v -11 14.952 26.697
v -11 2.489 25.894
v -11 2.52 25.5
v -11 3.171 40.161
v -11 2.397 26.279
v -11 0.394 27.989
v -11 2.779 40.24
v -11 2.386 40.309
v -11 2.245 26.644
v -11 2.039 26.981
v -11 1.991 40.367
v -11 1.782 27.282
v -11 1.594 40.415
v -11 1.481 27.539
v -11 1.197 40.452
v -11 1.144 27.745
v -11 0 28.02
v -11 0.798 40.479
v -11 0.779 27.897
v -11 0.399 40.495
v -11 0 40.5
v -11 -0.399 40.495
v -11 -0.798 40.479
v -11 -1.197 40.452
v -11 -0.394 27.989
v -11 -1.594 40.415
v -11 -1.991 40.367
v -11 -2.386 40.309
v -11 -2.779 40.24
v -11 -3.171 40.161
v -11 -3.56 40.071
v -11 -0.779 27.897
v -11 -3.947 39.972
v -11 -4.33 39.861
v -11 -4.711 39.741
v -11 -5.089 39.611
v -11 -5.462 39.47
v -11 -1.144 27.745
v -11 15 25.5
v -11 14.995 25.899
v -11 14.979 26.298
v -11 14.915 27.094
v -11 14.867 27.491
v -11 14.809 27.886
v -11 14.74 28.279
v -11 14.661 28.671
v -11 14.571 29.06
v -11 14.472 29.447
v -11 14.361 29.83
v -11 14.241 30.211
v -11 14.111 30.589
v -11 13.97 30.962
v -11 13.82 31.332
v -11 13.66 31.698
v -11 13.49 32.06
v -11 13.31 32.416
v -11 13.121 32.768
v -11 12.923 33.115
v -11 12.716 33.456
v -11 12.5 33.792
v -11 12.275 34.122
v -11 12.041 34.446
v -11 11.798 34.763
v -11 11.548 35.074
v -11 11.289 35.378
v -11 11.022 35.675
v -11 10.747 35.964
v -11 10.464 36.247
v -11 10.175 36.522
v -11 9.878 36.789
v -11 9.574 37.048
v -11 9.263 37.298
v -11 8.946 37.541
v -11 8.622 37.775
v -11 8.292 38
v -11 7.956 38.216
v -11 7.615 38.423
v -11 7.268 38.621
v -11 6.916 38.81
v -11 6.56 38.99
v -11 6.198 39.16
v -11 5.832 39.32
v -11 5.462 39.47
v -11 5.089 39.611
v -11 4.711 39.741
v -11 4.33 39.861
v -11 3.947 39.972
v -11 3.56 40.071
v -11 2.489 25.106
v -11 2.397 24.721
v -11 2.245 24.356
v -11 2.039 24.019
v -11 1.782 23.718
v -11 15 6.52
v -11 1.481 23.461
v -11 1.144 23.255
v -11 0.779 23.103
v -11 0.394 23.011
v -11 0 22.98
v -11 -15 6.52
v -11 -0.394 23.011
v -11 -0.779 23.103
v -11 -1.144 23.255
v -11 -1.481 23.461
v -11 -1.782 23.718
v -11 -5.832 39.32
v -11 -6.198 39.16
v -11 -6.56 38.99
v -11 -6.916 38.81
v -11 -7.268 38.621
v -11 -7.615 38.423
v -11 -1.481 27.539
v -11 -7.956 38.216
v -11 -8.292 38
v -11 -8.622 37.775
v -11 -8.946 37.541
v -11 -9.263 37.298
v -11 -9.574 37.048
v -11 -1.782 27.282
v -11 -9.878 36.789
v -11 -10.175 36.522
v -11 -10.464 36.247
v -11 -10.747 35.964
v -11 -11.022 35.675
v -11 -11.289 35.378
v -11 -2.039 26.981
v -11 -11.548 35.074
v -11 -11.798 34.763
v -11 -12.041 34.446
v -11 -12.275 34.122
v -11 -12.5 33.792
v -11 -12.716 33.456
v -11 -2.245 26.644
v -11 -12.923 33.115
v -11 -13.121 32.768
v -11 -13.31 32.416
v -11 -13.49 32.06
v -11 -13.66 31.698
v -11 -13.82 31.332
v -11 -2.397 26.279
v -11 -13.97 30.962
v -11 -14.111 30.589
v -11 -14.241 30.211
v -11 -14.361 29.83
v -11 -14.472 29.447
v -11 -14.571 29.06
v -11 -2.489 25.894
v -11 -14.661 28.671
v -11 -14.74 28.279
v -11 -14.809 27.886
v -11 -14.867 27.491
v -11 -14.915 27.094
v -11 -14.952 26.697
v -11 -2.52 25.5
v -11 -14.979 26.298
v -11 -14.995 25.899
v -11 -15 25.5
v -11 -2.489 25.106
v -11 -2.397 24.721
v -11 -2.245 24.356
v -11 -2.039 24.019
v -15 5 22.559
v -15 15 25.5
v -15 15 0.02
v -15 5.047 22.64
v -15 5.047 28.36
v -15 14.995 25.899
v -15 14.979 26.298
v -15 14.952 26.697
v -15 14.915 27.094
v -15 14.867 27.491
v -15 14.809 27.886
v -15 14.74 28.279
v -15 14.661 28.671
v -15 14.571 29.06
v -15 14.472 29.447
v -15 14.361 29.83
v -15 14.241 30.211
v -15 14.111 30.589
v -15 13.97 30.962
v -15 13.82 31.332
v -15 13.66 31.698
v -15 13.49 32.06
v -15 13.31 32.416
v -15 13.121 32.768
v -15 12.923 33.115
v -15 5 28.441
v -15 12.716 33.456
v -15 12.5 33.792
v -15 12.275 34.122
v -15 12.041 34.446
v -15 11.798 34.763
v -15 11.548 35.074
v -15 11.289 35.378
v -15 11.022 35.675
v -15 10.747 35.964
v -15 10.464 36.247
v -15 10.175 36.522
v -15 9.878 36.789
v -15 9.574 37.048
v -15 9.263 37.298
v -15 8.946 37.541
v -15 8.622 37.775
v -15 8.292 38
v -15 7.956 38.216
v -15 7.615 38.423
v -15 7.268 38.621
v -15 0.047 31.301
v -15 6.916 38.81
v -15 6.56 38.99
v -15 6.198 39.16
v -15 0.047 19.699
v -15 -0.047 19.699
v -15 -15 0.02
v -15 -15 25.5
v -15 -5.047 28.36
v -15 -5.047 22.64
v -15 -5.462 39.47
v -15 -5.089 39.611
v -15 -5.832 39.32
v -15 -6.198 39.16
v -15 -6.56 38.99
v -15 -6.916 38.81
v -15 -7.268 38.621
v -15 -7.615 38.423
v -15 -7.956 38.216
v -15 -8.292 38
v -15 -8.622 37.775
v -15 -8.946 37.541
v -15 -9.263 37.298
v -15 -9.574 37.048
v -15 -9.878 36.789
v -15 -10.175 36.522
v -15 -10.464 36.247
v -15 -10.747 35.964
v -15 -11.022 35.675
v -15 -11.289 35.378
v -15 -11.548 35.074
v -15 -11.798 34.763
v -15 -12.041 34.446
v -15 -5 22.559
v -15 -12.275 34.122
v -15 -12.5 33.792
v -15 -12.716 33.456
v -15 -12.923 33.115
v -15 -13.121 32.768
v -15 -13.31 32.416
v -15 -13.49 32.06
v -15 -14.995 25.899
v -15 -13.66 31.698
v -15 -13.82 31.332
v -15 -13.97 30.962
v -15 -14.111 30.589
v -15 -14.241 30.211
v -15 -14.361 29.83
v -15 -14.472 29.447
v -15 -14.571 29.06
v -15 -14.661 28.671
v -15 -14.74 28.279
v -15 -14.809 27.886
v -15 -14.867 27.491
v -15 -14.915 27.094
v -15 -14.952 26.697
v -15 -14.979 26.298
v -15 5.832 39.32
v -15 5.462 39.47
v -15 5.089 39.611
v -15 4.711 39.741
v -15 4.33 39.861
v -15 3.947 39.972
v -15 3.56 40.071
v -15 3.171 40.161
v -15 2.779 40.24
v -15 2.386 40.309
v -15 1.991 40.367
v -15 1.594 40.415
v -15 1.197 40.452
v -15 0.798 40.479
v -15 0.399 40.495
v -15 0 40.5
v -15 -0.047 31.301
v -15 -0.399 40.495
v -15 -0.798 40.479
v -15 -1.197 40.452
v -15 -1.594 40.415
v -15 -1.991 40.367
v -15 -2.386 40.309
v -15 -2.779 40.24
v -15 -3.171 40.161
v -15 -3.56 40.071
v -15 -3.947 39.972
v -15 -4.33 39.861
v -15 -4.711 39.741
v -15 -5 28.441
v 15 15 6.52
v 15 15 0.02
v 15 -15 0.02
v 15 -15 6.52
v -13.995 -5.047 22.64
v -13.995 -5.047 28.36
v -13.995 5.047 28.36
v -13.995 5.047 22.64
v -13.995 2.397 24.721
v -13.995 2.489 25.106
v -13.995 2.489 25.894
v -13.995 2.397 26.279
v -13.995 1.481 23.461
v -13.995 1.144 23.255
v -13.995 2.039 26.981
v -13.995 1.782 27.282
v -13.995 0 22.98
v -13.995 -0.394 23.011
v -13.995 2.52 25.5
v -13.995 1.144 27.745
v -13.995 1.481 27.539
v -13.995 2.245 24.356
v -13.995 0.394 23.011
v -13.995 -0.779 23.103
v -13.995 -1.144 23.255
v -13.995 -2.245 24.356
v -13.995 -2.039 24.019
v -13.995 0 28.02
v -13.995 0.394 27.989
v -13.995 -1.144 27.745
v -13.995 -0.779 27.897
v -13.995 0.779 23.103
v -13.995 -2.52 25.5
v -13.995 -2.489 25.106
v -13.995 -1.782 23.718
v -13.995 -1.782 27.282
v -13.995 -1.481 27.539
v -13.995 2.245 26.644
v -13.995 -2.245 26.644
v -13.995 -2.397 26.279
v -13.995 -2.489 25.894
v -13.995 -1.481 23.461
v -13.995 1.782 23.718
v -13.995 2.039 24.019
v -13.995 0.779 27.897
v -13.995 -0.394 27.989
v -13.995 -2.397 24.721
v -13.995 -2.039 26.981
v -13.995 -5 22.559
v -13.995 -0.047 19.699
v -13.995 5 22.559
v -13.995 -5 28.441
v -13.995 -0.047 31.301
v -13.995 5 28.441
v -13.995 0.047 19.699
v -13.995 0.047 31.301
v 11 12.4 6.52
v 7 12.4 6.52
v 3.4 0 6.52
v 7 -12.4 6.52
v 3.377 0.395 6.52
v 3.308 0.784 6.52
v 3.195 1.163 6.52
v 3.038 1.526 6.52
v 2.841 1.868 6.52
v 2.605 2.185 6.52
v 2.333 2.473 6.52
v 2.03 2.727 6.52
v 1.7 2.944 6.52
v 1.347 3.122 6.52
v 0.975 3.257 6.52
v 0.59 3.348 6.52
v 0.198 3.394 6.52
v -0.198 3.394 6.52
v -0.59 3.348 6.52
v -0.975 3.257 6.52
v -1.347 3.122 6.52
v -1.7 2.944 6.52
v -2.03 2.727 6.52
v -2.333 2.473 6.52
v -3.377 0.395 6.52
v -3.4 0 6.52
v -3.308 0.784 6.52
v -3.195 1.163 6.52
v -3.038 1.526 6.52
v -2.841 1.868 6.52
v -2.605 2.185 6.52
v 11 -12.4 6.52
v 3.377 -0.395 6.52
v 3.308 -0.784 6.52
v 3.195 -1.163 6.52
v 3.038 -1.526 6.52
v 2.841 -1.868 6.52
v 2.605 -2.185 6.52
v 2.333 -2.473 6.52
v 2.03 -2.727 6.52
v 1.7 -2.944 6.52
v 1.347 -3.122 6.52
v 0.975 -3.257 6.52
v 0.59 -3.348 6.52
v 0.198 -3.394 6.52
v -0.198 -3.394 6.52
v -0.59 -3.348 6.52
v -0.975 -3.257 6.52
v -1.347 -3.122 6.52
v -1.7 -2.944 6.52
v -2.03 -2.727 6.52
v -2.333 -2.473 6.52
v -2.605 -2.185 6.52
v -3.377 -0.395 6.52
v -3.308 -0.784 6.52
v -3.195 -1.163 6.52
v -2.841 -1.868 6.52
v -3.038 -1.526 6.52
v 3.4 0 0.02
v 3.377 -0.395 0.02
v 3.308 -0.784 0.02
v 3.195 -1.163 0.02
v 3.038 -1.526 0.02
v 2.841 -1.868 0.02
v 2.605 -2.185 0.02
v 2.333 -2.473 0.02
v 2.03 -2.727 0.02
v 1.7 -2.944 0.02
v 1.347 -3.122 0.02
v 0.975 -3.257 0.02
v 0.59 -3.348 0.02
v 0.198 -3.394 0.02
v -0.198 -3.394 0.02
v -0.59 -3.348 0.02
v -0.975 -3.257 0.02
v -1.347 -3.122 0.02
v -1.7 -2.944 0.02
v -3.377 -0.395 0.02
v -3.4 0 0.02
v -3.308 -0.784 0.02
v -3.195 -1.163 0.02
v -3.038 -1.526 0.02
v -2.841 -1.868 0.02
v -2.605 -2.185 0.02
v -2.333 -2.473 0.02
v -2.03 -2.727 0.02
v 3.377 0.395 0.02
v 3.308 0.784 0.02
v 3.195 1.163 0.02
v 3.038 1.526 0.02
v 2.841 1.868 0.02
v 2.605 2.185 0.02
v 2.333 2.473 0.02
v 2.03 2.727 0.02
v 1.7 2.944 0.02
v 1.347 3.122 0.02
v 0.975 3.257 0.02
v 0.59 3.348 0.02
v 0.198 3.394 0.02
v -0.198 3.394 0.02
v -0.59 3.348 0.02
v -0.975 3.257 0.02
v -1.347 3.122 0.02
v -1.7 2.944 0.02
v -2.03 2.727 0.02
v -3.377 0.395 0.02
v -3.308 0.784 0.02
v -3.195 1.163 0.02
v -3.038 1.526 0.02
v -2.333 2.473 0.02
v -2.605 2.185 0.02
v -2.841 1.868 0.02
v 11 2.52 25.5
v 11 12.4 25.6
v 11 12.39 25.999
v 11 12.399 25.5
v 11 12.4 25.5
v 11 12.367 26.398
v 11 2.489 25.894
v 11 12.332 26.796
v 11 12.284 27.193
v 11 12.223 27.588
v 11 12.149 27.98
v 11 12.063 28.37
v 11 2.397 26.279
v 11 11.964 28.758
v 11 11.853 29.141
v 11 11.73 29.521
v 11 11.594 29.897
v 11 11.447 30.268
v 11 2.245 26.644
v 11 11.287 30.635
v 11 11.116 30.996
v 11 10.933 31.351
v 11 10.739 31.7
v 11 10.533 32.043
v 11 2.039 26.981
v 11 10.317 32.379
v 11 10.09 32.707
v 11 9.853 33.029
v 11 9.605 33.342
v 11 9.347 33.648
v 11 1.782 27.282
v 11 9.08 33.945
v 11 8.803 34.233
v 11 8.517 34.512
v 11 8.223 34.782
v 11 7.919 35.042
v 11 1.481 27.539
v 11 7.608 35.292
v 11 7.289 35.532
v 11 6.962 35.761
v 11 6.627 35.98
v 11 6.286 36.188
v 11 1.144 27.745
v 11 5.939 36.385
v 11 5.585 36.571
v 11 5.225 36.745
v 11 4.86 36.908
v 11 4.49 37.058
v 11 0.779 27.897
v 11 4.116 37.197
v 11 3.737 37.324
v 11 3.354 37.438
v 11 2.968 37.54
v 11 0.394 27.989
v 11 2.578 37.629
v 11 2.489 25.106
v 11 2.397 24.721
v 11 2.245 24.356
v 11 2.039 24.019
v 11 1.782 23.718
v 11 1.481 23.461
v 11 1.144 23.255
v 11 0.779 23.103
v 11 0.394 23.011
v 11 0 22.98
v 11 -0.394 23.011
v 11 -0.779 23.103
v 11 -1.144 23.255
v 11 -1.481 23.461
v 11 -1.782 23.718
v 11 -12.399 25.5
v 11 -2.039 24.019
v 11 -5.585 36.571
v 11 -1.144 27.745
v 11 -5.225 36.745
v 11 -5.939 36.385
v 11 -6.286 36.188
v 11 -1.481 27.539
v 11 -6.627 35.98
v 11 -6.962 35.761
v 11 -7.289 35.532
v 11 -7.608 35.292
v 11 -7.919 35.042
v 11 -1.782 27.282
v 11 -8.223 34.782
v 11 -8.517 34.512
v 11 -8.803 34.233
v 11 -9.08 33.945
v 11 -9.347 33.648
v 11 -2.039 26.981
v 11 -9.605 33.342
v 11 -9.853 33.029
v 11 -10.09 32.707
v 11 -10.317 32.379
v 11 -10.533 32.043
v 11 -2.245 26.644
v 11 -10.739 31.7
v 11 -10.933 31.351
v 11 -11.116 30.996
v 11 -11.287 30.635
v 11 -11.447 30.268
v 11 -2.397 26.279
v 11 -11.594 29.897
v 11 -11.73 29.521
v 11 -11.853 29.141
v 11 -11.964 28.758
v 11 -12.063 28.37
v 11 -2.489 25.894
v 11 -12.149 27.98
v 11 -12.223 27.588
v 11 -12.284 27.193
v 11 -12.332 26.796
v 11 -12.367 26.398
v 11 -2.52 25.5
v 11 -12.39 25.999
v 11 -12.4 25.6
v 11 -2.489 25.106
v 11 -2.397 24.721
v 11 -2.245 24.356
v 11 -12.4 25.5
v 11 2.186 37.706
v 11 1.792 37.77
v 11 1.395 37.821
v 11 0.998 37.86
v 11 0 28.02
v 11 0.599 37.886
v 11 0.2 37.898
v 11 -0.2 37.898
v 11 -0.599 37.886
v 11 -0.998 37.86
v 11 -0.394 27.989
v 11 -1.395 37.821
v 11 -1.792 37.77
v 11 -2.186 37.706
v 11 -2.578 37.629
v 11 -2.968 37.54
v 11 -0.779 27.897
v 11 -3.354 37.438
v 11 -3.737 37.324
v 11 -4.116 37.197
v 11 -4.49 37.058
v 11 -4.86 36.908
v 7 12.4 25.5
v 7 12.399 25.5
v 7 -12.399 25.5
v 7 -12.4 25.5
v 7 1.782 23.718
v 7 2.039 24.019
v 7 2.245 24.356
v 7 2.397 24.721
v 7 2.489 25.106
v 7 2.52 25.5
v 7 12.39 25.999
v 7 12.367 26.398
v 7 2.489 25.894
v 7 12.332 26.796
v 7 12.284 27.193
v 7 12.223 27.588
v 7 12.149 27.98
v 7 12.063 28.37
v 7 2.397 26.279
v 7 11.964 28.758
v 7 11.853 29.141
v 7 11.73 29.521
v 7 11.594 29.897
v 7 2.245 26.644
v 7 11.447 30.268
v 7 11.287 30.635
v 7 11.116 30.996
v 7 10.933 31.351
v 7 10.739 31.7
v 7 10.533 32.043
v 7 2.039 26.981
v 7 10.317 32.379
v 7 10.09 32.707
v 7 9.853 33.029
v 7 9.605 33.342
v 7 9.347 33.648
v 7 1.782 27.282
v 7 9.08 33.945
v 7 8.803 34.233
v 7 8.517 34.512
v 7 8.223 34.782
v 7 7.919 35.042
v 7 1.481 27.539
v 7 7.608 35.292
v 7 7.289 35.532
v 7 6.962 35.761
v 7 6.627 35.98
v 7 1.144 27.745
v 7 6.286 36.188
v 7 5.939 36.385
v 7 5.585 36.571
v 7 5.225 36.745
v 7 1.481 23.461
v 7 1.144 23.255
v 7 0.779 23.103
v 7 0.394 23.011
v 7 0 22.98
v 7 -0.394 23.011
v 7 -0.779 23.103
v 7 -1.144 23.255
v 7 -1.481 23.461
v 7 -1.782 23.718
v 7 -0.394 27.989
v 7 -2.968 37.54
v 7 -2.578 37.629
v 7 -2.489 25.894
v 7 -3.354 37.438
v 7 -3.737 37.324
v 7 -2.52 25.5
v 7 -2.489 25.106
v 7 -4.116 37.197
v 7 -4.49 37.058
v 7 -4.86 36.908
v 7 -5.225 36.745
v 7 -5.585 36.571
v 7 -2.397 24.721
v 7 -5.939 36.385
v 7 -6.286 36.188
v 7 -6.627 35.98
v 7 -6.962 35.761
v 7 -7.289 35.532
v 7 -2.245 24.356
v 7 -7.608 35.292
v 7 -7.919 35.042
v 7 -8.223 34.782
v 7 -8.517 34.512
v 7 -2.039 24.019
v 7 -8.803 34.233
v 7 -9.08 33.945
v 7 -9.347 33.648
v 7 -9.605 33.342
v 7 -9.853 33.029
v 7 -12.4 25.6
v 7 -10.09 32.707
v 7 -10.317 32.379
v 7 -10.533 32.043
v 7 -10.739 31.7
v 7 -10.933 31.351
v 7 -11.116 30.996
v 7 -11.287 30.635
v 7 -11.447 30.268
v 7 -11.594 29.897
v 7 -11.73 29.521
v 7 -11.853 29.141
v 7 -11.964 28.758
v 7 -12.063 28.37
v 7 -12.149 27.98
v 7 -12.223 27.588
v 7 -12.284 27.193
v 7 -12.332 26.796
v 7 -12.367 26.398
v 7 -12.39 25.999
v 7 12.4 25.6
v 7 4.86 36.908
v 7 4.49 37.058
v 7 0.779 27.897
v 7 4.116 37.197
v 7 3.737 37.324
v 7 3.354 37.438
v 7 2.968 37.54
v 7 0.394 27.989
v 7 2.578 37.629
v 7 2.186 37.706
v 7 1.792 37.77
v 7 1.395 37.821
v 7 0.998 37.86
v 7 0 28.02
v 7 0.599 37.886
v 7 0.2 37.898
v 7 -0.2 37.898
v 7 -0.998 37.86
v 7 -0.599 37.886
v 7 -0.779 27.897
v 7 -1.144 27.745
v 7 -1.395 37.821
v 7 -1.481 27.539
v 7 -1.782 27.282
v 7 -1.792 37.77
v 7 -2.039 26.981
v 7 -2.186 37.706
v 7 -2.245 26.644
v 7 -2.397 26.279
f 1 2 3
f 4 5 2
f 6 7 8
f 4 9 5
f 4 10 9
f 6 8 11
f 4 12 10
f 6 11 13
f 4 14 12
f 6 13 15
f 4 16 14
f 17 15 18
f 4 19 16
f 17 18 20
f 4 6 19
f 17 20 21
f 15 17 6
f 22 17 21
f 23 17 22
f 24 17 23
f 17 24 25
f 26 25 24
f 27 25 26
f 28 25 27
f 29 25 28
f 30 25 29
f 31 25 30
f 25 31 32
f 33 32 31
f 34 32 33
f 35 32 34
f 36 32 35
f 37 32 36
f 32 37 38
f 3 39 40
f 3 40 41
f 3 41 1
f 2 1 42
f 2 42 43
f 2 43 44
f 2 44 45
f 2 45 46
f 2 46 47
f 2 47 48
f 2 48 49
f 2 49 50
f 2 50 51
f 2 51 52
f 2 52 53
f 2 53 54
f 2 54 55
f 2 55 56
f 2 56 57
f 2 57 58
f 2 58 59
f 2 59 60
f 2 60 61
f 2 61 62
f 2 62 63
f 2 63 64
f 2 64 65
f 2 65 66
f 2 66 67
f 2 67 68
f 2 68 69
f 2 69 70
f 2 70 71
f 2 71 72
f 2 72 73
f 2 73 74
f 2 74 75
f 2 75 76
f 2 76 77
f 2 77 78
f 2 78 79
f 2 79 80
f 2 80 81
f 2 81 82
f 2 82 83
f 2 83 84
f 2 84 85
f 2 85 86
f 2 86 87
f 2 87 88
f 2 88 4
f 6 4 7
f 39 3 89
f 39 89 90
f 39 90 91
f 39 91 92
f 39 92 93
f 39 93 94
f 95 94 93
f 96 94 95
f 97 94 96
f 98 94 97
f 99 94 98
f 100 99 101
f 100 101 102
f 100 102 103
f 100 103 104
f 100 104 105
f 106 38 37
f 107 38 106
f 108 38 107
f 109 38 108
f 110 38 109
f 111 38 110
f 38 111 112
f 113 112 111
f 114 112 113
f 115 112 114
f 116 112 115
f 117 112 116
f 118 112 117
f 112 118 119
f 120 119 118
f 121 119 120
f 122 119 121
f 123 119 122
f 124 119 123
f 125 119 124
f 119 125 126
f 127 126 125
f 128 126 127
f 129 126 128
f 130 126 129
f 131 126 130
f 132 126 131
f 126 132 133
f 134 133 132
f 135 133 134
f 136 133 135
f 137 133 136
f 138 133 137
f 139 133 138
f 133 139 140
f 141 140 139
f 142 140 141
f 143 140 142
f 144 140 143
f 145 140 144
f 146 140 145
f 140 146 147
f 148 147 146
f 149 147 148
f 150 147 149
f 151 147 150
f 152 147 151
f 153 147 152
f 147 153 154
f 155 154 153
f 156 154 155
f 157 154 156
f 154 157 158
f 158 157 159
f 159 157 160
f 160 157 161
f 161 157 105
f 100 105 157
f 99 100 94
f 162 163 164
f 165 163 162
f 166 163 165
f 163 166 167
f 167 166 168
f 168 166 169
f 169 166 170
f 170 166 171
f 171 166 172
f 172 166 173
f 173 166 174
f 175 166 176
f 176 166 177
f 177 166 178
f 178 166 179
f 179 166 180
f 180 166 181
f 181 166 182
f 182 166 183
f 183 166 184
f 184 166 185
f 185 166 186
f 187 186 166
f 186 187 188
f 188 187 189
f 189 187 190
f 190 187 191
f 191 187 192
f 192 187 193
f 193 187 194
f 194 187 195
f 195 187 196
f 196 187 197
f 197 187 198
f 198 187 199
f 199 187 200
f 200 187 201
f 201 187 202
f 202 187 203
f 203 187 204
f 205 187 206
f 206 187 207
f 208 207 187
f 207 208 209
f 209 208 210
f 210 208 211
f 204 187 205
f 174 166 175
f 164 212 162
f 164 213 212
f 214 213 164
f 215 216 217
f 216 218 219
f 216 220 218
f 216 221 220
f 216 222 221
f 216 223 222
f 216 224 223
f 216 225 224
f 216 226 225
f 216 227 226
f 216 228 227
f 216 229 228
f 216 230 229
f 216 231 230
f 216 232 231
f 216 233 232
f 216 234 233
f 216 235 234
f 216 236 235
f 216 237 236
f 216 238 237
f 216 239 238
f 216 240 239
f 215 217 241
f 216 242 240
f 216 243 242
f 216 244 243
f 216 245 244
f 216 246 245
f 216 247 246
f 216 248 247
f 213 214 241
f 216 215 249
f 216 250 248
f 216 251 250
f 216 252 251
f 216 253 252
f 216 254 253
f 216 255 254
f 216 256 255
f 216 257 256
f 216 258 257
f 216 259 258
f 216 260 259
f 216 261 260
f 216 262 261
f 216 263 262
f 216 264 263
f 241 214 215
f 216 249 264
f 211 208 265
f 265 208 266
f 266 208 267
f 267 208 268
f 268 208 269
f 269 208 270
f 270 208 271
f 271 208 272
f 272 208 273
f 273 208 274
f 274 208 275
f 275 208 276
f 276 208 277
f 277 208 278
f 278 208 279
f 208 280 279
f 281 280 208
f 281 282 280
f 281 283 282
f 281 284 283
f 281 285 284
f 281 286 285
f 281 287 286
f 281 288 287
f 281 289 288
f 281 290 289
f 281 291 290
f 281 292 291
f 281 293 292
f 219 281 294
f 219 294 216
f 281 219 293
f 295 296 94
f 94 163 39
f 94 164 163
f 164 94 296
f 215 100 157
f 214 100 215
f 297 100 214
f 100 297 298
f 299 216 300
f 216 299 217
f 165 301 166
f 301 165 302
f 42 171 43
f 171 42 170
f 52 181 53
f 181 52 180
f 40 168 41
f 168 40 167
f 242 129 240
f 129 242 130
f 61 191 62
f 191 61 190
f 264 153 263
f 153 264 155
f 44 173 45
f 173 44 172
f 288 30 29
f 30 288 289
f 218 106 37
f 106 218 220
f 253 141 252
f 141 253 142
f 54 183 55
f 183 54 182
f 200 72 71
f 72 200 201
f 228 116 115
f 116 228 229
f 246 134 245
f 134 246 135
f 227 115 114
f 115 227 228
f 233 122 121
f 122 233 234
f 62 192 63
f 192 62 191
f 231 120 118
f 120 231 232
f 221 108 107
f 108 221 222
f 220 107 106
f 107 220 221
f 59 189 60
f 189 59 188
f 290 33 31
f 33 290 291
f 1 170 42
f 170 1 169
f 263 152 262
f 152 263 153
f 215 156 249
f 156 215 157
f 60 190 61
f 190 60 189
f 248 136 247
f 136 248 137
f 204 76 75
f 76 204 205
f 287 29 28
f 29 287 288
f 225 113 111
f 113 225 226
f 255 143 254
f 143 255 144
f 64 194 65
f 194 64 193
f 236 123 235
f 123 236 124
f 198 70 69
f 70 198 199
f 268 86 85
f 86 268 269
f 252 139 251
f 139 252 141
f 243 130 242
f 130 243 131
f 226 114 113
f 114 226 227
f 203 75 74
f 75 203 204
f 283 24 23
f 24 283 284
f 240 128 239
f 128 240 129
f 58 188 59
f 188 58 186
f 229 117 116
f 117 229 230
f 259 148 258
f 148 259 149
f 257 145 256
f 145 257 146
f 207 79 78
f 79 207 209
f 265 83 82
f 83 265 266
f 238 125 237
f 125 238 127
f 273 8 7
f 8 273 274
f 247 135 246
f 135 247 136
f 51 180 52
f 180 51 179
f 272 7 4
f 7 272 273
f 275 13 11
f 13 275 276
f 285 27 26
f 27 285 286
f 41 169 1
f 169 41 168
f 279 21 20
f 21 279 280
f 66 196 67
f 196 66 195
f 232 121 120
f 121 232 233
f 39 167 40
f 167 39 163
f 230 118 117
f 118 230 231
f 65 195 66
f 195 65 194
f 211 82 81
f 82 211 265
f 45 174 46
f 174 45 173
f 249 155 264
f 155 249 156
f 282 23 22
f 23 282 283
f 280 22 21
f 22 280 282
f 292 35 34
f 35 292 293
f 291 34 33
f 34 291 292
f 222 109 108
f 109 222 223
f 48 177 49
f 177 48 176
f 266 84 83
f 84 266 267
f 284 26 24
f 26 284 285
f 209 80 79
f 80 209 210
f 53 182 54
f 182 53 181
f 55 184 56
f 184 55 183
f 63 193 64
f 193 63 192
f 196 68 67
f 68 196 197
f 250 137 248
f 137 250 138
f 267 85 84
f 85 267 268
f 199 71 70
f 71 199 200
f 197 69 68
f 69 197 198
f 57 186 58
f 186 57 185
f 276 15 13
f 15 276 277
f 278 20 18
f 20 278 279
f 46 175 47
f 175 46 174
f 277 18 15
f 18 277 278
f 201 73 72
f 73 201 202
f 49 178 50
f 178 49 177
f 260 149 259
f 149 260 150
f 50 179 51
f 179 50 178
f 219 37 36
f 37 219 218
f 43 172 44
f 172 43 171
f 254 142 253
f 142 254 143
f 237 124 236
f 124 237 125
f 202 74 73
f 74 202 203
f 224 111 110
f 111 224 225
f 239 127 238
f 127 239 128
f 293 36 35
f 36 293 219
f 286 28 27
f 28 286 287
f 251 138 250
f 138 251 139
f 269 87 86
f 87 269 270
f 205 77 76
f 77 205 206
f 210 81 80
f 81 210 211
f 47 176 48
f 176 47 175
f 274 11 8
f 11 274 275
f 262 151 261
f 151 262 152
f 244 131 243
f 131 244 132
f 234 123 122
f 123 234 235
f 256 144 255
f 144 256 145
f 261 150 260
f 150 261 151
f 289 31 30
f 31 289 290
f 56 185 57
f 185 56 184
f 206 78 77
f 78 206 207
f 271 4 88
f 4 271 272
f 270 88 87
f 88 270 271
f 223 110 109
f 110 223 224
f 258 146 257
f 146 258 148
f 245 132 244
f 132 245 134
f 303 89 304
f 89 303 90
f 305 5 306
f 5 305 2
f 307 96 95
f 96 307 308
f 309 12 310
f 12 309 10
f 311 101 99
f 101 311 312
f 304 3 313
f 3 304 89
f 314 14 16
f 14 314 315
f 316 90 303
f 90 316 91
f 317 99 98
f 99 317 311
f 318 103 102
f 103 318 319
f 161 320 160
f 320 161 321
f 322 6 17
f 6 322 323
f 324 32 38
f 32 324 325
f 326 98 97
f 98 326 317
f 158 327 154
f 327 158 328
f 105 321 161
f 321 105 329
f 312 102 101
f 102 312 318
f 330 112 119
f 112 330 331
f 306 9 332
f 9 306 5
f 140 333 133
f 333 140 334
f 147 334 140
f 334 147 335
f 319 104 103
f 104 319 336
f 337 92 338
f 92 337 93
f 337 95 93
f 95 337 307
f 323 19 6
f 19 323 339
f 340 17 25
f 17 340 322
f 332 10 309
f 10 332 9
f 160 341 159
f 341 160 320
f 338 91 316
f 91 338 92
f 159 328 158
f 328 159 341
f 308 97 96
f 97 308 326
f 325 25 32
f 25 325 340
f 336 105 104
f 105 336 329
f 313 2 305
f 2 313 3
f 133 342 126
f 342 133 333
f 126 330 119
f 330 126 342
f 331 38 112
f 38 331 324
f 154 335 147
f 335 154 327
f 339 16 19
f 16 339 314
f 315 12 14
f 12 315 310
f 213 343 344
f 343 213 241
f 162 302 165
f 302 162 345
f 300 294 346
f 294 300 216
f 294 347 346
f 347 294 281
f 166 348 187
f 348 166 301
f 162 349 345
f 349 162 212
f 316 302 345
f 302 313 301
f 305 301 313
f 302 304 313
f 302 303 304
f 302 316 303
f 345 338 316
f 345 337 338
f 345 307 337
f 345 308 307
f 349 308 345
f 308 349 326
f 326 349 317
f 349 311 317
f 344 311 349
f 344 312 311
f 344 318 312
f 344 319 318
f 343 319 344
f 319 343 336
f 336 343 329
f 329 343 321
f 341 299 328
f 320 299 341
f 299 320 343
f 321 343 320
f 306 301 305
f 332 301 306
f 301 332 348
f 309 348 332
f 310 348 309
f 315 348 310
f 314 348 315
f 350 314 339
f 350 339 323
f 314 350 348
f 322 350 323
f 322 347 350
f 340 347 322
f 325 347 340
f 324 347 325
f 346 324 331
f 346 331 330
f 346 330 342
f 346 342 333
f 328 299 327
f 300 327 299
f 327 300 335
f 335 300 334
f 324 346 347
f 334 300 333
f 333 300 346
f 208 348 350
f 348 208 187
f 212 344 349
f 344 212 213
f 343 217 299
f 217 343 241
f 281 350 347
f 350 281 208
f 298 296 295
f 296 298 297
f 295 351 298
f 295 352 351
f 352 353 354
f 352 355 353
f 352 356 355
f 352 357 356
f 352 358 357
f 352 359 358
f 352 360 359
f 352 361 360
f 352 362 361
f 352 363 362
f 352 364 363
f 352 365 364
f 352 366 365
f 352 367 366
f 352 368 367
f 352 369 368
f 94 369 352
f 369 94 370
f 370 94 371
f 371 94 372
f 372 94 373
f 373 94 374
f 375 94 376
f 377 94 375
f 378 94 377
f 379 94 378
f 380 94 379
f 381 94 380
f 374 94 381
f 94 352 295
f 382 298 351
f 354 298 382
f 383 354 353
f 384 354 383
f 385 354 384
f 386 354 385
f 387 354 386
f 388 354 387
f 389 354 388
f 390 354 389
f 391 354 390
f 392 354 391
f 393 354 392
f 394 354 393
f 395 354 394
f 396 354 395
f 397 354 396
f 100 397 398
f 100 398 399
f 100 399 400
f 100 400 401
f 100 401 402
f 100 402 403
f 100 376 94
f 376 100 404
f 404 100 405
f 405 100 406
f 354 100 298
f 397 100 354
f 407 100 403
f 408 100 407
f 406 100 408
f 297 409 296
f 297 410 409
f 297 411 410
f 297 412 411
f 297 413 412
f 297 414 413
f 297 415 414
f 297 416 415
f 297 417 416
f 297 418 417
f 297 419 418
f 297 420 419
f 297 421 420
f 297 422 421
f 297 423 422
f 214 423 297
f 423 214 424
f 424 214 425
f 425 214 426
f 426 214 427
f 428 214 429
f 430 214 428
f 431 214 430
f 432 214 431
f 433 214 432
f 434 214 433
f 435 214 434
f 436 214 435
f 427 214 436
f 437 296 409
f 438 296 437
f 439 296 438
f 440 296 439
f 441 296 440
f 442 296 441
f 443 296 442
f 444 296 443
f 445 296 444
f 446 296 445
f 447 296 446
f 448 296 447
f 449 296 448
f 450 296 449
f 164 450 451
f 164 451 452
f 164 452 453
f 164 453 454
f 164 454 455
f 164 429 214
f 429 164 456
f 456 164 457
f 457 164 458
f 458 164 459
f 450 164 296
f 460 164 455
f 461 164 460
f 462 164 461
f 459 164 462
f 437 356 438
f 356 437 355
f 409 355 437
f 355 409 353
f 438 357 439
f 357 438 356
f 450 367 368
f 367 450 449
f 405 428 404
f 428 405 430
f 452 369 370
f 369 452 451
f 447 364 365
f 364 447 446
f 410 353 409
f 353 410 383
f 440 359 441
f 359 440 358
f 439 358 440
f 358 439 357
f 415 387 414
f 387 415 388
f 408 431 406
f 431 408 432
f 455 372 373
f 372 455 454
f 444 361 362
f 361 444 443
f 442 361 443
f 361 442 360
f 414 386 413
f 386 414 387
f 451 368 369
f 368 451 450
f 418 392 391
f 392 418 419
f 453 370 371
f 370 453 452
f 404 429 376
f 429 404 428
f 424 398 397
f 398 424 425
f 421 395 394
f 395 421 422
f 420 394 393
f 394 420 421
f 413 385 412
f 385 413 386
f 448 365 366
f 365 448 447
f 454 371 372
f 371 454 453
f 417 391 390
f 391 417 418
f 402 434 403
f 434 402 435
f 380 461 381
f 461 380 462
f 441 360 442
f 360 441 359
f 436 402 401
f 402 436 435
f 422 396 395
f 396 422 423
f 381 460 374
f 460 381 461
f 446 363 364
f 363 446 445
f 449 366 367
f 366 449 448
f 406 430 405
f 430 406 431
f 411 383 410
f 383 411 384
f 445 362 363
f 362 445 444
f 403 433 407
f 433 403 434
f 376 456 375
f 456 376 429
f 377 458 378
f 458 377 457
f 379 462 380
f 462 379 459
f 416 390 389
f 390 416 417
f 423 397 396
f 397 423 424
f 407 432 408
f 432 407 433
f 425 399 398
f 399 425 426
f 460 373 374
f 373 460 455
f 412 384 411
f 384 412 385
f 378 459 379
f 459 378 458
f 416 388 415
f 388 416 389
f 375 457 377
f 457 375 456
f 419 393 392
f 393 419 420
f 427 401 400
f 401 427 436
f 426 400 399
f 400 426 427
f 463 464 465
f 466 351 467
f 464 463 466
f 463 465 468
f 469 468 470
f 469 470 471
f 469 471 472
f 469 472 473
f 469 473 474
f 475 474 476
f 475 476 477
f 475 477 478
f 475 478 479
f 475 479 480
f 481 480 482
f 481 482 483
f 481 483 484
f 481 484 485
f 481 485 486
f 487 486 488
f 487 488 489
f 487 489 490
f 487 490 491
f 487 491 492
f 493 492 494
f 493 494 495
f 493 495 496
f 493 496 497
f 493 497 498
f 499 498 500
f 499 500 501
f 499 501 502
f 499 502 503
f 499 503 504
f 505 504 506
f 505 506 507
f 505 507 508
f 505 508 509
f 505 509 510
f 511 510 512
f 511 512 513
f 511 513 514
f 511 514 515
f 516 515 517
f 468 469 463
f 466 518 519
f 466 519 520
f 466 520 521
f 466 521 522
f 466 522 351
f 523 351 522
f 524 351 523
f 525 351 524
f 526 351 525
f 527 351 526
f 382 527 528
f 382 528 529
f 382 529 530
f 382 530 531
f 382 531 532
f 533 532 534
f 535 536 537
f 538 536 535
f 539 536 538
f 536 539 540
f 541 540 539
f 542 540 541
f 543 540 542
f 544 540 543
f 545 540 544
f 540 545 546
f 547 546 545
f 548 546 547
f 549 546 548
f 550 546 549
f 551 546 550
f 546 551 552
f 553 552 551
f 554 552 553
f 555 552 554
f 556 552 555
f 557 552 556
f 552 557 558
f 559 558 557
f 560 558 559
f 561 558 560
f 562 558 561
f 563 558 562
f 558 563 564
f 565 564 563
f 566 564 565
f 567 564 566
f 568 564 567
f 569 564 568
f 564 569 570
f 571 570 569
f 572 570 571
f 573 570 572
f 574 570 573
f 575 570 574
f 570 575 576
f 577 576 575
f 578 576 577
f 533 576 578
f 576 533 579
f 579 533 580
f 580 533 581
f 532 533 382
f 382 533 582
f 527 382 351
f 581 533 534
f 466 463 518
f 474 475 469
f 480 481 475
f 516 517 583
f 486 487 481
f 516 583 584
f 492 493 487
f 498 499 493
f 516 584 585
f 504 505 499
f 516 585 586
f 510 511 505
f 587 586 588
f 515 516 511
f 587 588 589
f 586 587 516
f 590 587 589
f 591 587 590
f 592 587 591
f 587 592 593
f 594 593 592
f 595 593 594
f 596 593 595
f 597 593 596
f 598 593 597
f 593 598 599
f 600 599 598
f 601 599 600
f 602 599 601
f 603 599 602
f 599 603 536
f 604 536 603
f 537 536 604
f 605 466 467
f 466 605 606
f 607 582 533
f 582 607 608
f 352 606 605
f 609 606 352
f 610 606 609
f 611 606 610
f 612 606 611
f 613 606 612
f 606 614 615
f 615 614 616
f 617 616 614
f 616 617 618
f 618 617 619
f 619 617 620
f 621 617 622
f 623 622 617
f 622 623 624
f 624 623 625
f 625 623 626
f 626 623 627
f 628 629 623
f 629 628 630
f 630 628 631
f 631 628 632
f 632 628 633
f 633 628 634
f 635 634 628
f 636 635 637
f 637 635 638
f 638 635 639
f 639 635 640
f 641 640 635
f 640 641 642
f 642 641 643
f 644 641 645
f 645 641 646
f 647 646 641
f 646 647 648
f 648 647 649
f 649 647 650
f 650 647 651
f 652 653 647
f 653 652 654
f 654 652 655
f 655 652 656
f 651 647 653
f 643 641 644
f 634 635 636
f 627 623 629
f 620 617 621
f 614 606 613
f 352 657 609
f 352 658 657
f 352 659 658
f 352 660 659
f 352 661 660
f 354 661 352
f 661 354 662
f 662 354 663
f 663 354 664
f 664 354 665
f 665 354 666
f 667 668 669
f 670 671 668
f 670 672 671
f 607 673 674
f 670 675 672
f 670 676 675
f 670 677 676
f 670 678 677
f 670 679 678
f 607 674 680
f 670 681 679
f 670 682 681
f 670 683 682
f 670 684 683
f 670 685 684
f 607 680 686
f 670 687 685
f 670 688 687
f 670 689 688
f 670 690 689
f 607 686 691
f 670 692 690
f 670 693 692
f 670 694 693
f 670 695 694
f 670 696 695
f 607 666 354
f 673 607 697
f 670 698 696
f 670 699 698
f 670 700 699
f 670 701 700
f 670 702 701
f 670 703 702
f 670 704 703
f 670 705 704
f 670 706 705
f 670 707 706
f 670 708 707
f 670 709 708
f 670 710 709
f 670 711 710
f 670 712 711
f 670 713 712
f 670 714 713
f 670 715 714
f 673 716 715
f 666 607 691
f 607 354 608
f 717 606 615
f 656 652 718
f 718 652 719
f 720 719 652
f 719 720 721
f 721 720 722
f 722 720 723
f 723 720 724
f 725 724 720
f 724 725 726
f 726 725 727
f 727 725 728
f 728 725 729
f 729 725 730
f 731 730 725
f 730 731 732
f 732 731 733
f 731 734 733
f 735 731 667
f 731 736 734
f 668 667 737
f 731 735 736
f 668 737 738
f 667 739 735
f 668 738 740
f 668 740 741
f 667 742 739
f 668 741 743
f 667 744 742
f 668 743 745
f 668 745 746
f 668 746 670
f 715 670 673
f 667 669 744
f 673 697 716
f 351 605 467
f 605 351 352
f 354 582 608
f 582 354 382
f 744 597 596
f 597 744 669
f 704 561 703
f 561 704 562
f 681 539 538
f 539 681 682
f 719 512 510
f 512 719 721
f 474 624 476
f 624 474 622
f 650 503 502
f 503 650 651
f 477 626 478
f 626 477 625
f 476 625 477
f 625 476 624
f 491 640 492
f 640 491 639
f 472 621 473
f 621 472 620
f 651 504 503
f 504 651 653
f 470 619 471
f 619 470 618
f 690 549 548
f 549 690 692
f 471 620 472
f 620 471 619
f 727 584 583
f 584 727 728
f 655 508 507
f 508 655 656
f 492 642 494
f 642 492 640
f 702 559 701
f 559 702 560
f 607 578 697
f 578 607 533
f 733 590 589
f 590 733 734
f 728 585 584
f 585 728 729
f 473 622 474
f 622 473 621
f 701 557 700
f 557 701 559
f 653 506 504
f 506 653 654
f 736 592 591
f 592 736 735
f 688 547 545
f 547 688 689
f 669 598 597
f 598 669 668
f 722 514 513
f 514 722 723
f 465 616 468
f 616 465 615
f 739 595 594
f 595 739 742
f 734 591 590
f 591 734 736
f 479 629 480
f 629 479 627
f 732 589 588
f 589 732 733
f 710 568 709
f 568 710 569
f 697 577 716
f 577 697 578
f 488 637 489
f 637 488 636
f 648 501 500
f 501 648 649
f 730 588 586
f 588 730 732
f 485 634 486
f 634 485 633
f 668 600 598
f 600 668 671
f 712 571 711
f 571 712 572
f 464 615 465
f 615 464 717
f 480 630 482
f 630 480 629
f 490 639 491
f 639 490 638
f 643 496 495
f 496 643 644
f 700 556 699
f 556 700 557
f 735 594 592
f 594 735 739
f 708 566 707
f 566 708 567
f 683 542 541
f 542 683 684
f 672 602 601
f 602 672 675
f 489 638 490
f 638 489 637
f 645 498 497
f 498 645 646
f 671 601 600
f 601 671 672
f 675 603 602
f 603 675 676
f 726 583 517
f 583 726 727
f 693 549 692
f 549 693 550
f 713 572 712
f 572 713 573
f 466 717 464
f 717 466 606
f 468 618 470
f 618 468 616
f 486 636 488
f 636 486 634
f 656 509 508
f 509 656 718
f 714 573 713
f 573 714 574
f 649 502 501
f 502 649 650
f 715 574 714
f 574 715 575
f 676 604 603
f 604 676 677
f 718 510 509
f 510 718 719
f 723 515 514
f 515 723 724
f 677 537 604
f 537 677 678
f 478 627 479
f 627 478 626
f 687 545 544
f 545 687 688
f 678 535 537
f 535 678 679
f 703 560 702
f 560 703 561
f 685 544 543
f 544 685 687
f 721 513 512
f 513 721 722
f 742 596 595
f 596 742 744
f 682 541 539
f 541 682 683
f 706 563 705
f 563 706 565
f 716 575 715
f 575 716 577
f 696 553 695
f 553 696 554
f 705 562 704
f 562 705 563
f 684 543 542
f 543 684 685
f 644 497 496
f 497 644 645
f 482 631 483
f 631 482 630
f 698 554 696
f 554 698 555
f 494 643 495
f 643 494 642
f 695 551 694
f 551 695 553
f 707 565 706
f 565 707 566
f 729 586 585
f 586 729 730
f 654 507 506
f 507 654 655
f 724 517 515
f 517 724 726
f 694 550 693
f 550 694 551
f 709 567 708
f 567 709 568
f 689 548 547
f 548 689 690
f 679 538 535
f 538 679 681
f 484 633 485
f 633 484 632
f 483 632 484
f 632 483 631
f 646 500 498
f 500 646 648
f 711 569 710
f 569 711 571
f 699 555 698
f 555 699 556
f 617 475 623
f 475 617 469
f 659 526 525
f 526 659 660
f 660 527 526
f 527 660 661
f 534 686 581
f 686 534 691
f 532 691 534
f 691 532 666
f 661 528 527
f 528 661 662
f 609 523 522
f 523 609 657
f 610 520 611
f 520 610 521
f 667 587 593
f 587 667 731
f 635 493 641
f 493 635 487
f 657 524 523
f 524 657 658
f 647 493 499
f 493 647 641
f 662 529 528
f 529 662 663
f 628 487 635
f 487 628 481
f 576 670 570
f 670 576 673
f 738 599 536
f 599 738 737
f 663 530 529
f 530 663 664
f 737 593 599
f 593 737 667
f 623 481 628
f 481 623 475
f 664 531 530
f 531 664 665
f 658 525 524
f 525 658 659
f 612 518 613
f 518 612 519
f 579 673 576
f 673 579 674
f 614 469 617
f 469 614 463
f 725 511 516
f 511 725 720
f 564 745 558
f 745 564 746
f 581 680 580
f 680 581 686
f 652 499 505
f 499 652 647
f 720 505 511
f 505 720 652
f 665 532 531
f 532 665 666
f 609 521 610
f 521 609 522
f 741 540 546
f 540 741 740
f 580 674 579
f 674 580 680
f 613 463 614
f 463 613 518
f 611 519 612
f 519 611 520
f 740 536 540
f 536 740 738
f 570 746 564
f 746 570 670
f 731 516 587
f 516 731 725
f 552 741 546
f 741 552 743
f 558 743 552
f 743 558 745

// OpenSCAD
$fa = 1;
$fs = 0.4;

module phex(wid,rad,height){
hull(){
translate([wid/2-rad,0,0])cylinder(r=rad,h=height);
rotate([0,0,60])translate([wid/2-rad,0,0])cylinder(r=rad,h=height);
rotate([0,0,120])translate([wid/2-rad,0,0])cylinder(r=rad,h=height);
rotate([0,0,180])translate([wid/2-rad,0,0])cylinder(r=rad,h=height);
rotate([0,0,240])translate([wid/2-rad,0,0])cylinder(r=rad,h=height);
rotate([0,0,300])translate([wid/2-rad,0,0])cylinder(r=rad,h=height);

}
}

module fhex(wid,height){
hull(){
cube([wid/1.7,wid,height],center = true);
rotate([0,0,120])cube([wid/1.7,wid,height],center = true);
rotate([0,0,240])cube([wid/1.7,wid,height],center = true);
}
}


translate([-(15-4/2),0,19/2+6.5])

difference(){
cube([4,30,19],center=true);

translate([0,0,19/2])
rotate([0,90,0])
cylinder(h=4+0.001,r=5.04/2,center=true);

translate([-1,0,19/2])
rotate([0,90,0])
fhex(10,2+0.01);
}



translate([-(15-4/2),0,19+6.5])
rotate([0,90,0])
difference(){
cylinder(h=4,r=15,center=true);
cylinder(h=4+0.001,r=5.04/2,center=true);

translate([0,0,-2])
rotate([0,0,0])
fhex(10,2+0.01);

}

translate([0,0,6.5/2+0.02])
difference(){
color([1,0,0])cube([30,30,6.5],center=true);
cylinder(h=6.6,r=6.8/2,center=true);
}

translate([15-4-4/2,0,19/2+6.5])
difference(){
cube([4,24.8,19],center=true);

translate([0,0,19/2])
rotate([0,90,0])
    cylinder(h=4+0.001,r=5.04/2,center=true);
}



translate([(15-4/2-4),0,19+6.5])
rotate([0,90,0])

difference(){
cylinder(h=4,r=12.4,center=true);
cylinder(h=4+0.001,r=5.04/2,center=true);
}
